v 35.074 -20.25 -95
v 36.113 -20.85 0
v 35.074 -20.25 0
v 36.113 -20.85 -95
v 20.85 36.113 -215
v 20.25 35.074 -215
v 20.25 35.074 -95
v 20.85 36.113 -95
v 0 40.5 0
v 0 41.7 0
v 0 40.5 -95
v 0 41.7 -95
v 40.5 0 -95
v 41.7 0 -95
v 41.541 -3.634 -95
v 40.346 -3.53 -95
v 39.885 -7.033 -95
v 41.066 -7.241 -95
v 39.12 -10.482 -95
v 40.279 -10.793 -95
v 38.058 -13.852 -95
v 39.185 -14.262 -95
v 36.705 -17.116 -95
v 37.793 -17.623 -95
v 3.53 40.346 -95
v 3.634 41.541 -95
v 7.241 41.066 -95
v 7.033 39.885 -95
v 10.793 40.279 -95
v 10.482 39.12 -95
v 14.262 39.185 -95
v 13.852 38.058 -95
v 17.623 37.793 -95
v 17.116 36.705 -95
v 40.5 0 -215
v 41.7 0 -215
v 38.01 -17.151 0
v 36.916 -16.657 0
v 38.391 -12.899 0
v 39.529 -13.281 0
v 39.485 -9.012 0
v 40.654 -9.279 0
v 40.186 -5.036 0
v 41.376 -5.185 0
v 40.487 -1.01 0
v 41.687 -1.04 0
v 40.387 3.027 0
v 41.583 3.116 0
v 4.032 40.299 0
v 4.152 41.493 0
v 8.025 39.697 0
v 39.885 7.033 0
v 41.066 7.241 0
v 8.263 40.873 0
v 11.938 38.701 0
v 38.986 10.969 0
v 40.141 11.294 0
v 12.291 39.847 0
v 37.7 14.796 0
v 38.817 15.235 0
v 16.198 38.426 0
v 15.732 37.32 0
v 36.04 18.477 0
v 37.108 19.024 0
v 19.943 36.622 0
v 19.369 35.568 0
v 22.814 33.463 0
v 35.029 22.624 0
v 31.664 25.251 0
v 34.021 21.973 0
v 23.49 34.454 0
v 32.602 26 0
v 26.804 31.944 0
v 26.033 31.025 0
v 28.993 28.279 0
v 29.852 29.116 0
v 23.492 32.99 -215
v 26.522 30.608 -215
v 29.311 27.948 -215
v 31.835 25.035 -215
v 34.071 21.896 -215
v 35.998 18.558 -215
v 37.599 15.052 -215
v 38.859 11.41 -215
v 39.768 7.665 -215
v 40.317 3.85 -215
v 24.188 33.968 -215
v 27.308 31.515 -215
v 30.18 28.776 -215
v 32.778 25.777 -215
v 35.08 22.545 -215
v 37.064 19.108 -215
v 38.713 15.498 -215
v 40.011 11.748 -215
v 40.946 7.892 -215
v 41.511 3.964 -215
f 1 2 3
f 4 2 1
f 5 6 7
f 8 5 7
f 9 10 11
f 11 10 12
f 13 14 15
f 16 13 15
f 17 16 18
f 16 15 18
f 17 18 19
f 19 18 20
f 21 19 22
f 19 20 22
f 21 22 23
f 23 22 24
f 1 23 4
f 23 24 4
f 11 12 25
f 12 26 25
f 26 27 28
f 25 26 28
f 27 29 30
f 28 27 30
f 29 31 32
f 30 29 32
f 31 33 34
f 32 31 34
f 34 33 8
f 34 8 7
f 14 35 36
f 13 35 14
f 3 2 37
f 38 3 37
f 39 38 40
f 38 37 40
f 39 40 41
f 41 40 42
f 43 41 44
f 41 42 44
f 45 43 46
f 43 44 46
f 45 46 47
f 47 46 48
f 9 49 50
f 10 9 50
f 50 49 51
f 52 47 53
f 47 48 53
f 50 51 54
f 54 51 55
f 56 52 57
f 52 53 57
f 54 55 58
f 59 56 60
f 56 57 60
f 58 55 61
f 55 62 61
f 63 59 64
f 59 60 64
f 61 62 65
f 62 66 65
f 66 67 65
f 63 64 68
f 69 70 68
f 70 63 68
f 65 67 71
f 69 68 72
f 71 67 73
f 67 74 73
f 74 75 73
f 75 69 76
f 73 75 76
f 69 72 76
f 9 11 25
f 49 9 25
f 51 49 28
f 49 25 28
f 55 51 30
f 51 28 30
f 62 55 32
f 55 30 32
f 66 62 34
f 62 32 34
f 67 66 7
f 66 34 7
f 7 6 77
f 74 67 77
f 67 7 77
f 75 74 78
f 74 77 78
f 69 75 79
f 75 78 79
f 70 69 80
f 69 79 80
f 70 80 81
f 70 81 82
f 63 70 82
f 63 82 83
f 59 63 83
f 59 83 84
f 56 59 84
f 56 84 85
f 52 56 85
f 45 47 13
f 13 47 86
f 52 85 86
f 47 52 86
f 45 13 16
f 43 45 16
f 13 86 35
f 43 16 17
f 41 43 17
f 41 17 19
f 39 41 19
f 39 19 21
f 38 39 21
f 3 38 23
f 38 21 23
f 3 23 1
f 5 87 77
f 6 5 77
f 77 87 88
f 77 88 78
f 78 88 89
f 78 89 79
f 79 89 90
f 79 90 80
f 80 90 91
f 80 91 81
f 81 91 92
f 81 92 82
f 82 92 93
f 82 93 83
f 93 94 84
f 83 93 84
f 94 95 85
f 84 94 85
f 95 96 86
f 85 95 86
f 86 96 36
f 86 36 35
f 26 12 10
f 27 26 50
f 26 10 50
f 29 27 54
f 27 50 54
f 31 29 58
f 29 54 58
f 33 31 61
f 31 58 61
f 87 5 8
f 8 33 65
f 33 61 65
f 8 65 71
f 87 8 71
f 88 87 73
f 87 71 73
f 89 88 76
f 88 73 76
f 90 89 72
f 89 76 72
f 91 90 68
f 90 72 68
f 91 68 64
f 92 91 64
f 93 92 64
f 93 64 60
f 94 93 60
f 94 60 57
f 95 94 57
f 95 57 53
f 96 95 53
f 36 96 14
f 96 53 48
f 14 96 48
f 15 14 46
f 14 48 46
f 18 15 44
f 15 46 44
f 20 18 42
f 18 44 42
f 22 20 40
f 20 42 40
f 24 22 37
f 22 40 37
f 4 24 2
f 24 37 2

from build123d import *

# Parameters (mm, degrees)
REVOLVE_1_ANGLE           = 120.00000000000027
REVOLVE_2_ANGLE           = 30.000000000000068
REVOLVE_2_OTHER_WAY_ANGLE = 30.000000000000068


with BuildPart() as part:
    # Эскиз1 → Повернуть1 (revolve)
    with BuildSketch(Plane(origin=(0, 0, 0), x_dir=(0, 0, -1), z_dir=(1, 0, 0))):
        Polygon((-2e-17, 41.7), (-4.23e-15, 40.5), (95, 40.5), (95, 41.70000000000002), align=None)
    revolve(axis=Axis((0, 0, 0), (0, 0, -1)), revolution_arc=REVOLVE_1_ANGLE)

    # Эскиз3 → Повернуть2 (revolve)
    with BuildSketch(Plane(origin=(0, 0, 0), x_dir=(0, 0, 1), z_dir=(0.499999999999998, -0.8660254037844398, 0))):
        Polygon((-95, -40.500000000000014), (-215, -40.50000000000003), (-215, -41.70000000000003), (-95, -41.700000000000024), align=None)
    revolve(axis=Axis((0, 0, -95), (0, 0, 1)), revolution_arc=REVOLVE_2_ANGLE)

    # Эскиз3 → Повернуть2 other way (revolve)
    with BuildSketch(Plane(origin=(0, 0, 0), x_dir=(0, 0, 1), z_dir=(0.499999999999998, -0.8660254037844398, 0))):
        Polygon((-95, -40.500000000000014), (-215, -40.50000000000003), (-215, -41.70000000000003), (-95, -41.700000000000024), align=None)
    revolve(axis=Axis((0, 0, -95), (0, 0, -1)), revolution_arc=REVOLVE_2_OTHER_WAY_ANGLE)


solid = part.part
